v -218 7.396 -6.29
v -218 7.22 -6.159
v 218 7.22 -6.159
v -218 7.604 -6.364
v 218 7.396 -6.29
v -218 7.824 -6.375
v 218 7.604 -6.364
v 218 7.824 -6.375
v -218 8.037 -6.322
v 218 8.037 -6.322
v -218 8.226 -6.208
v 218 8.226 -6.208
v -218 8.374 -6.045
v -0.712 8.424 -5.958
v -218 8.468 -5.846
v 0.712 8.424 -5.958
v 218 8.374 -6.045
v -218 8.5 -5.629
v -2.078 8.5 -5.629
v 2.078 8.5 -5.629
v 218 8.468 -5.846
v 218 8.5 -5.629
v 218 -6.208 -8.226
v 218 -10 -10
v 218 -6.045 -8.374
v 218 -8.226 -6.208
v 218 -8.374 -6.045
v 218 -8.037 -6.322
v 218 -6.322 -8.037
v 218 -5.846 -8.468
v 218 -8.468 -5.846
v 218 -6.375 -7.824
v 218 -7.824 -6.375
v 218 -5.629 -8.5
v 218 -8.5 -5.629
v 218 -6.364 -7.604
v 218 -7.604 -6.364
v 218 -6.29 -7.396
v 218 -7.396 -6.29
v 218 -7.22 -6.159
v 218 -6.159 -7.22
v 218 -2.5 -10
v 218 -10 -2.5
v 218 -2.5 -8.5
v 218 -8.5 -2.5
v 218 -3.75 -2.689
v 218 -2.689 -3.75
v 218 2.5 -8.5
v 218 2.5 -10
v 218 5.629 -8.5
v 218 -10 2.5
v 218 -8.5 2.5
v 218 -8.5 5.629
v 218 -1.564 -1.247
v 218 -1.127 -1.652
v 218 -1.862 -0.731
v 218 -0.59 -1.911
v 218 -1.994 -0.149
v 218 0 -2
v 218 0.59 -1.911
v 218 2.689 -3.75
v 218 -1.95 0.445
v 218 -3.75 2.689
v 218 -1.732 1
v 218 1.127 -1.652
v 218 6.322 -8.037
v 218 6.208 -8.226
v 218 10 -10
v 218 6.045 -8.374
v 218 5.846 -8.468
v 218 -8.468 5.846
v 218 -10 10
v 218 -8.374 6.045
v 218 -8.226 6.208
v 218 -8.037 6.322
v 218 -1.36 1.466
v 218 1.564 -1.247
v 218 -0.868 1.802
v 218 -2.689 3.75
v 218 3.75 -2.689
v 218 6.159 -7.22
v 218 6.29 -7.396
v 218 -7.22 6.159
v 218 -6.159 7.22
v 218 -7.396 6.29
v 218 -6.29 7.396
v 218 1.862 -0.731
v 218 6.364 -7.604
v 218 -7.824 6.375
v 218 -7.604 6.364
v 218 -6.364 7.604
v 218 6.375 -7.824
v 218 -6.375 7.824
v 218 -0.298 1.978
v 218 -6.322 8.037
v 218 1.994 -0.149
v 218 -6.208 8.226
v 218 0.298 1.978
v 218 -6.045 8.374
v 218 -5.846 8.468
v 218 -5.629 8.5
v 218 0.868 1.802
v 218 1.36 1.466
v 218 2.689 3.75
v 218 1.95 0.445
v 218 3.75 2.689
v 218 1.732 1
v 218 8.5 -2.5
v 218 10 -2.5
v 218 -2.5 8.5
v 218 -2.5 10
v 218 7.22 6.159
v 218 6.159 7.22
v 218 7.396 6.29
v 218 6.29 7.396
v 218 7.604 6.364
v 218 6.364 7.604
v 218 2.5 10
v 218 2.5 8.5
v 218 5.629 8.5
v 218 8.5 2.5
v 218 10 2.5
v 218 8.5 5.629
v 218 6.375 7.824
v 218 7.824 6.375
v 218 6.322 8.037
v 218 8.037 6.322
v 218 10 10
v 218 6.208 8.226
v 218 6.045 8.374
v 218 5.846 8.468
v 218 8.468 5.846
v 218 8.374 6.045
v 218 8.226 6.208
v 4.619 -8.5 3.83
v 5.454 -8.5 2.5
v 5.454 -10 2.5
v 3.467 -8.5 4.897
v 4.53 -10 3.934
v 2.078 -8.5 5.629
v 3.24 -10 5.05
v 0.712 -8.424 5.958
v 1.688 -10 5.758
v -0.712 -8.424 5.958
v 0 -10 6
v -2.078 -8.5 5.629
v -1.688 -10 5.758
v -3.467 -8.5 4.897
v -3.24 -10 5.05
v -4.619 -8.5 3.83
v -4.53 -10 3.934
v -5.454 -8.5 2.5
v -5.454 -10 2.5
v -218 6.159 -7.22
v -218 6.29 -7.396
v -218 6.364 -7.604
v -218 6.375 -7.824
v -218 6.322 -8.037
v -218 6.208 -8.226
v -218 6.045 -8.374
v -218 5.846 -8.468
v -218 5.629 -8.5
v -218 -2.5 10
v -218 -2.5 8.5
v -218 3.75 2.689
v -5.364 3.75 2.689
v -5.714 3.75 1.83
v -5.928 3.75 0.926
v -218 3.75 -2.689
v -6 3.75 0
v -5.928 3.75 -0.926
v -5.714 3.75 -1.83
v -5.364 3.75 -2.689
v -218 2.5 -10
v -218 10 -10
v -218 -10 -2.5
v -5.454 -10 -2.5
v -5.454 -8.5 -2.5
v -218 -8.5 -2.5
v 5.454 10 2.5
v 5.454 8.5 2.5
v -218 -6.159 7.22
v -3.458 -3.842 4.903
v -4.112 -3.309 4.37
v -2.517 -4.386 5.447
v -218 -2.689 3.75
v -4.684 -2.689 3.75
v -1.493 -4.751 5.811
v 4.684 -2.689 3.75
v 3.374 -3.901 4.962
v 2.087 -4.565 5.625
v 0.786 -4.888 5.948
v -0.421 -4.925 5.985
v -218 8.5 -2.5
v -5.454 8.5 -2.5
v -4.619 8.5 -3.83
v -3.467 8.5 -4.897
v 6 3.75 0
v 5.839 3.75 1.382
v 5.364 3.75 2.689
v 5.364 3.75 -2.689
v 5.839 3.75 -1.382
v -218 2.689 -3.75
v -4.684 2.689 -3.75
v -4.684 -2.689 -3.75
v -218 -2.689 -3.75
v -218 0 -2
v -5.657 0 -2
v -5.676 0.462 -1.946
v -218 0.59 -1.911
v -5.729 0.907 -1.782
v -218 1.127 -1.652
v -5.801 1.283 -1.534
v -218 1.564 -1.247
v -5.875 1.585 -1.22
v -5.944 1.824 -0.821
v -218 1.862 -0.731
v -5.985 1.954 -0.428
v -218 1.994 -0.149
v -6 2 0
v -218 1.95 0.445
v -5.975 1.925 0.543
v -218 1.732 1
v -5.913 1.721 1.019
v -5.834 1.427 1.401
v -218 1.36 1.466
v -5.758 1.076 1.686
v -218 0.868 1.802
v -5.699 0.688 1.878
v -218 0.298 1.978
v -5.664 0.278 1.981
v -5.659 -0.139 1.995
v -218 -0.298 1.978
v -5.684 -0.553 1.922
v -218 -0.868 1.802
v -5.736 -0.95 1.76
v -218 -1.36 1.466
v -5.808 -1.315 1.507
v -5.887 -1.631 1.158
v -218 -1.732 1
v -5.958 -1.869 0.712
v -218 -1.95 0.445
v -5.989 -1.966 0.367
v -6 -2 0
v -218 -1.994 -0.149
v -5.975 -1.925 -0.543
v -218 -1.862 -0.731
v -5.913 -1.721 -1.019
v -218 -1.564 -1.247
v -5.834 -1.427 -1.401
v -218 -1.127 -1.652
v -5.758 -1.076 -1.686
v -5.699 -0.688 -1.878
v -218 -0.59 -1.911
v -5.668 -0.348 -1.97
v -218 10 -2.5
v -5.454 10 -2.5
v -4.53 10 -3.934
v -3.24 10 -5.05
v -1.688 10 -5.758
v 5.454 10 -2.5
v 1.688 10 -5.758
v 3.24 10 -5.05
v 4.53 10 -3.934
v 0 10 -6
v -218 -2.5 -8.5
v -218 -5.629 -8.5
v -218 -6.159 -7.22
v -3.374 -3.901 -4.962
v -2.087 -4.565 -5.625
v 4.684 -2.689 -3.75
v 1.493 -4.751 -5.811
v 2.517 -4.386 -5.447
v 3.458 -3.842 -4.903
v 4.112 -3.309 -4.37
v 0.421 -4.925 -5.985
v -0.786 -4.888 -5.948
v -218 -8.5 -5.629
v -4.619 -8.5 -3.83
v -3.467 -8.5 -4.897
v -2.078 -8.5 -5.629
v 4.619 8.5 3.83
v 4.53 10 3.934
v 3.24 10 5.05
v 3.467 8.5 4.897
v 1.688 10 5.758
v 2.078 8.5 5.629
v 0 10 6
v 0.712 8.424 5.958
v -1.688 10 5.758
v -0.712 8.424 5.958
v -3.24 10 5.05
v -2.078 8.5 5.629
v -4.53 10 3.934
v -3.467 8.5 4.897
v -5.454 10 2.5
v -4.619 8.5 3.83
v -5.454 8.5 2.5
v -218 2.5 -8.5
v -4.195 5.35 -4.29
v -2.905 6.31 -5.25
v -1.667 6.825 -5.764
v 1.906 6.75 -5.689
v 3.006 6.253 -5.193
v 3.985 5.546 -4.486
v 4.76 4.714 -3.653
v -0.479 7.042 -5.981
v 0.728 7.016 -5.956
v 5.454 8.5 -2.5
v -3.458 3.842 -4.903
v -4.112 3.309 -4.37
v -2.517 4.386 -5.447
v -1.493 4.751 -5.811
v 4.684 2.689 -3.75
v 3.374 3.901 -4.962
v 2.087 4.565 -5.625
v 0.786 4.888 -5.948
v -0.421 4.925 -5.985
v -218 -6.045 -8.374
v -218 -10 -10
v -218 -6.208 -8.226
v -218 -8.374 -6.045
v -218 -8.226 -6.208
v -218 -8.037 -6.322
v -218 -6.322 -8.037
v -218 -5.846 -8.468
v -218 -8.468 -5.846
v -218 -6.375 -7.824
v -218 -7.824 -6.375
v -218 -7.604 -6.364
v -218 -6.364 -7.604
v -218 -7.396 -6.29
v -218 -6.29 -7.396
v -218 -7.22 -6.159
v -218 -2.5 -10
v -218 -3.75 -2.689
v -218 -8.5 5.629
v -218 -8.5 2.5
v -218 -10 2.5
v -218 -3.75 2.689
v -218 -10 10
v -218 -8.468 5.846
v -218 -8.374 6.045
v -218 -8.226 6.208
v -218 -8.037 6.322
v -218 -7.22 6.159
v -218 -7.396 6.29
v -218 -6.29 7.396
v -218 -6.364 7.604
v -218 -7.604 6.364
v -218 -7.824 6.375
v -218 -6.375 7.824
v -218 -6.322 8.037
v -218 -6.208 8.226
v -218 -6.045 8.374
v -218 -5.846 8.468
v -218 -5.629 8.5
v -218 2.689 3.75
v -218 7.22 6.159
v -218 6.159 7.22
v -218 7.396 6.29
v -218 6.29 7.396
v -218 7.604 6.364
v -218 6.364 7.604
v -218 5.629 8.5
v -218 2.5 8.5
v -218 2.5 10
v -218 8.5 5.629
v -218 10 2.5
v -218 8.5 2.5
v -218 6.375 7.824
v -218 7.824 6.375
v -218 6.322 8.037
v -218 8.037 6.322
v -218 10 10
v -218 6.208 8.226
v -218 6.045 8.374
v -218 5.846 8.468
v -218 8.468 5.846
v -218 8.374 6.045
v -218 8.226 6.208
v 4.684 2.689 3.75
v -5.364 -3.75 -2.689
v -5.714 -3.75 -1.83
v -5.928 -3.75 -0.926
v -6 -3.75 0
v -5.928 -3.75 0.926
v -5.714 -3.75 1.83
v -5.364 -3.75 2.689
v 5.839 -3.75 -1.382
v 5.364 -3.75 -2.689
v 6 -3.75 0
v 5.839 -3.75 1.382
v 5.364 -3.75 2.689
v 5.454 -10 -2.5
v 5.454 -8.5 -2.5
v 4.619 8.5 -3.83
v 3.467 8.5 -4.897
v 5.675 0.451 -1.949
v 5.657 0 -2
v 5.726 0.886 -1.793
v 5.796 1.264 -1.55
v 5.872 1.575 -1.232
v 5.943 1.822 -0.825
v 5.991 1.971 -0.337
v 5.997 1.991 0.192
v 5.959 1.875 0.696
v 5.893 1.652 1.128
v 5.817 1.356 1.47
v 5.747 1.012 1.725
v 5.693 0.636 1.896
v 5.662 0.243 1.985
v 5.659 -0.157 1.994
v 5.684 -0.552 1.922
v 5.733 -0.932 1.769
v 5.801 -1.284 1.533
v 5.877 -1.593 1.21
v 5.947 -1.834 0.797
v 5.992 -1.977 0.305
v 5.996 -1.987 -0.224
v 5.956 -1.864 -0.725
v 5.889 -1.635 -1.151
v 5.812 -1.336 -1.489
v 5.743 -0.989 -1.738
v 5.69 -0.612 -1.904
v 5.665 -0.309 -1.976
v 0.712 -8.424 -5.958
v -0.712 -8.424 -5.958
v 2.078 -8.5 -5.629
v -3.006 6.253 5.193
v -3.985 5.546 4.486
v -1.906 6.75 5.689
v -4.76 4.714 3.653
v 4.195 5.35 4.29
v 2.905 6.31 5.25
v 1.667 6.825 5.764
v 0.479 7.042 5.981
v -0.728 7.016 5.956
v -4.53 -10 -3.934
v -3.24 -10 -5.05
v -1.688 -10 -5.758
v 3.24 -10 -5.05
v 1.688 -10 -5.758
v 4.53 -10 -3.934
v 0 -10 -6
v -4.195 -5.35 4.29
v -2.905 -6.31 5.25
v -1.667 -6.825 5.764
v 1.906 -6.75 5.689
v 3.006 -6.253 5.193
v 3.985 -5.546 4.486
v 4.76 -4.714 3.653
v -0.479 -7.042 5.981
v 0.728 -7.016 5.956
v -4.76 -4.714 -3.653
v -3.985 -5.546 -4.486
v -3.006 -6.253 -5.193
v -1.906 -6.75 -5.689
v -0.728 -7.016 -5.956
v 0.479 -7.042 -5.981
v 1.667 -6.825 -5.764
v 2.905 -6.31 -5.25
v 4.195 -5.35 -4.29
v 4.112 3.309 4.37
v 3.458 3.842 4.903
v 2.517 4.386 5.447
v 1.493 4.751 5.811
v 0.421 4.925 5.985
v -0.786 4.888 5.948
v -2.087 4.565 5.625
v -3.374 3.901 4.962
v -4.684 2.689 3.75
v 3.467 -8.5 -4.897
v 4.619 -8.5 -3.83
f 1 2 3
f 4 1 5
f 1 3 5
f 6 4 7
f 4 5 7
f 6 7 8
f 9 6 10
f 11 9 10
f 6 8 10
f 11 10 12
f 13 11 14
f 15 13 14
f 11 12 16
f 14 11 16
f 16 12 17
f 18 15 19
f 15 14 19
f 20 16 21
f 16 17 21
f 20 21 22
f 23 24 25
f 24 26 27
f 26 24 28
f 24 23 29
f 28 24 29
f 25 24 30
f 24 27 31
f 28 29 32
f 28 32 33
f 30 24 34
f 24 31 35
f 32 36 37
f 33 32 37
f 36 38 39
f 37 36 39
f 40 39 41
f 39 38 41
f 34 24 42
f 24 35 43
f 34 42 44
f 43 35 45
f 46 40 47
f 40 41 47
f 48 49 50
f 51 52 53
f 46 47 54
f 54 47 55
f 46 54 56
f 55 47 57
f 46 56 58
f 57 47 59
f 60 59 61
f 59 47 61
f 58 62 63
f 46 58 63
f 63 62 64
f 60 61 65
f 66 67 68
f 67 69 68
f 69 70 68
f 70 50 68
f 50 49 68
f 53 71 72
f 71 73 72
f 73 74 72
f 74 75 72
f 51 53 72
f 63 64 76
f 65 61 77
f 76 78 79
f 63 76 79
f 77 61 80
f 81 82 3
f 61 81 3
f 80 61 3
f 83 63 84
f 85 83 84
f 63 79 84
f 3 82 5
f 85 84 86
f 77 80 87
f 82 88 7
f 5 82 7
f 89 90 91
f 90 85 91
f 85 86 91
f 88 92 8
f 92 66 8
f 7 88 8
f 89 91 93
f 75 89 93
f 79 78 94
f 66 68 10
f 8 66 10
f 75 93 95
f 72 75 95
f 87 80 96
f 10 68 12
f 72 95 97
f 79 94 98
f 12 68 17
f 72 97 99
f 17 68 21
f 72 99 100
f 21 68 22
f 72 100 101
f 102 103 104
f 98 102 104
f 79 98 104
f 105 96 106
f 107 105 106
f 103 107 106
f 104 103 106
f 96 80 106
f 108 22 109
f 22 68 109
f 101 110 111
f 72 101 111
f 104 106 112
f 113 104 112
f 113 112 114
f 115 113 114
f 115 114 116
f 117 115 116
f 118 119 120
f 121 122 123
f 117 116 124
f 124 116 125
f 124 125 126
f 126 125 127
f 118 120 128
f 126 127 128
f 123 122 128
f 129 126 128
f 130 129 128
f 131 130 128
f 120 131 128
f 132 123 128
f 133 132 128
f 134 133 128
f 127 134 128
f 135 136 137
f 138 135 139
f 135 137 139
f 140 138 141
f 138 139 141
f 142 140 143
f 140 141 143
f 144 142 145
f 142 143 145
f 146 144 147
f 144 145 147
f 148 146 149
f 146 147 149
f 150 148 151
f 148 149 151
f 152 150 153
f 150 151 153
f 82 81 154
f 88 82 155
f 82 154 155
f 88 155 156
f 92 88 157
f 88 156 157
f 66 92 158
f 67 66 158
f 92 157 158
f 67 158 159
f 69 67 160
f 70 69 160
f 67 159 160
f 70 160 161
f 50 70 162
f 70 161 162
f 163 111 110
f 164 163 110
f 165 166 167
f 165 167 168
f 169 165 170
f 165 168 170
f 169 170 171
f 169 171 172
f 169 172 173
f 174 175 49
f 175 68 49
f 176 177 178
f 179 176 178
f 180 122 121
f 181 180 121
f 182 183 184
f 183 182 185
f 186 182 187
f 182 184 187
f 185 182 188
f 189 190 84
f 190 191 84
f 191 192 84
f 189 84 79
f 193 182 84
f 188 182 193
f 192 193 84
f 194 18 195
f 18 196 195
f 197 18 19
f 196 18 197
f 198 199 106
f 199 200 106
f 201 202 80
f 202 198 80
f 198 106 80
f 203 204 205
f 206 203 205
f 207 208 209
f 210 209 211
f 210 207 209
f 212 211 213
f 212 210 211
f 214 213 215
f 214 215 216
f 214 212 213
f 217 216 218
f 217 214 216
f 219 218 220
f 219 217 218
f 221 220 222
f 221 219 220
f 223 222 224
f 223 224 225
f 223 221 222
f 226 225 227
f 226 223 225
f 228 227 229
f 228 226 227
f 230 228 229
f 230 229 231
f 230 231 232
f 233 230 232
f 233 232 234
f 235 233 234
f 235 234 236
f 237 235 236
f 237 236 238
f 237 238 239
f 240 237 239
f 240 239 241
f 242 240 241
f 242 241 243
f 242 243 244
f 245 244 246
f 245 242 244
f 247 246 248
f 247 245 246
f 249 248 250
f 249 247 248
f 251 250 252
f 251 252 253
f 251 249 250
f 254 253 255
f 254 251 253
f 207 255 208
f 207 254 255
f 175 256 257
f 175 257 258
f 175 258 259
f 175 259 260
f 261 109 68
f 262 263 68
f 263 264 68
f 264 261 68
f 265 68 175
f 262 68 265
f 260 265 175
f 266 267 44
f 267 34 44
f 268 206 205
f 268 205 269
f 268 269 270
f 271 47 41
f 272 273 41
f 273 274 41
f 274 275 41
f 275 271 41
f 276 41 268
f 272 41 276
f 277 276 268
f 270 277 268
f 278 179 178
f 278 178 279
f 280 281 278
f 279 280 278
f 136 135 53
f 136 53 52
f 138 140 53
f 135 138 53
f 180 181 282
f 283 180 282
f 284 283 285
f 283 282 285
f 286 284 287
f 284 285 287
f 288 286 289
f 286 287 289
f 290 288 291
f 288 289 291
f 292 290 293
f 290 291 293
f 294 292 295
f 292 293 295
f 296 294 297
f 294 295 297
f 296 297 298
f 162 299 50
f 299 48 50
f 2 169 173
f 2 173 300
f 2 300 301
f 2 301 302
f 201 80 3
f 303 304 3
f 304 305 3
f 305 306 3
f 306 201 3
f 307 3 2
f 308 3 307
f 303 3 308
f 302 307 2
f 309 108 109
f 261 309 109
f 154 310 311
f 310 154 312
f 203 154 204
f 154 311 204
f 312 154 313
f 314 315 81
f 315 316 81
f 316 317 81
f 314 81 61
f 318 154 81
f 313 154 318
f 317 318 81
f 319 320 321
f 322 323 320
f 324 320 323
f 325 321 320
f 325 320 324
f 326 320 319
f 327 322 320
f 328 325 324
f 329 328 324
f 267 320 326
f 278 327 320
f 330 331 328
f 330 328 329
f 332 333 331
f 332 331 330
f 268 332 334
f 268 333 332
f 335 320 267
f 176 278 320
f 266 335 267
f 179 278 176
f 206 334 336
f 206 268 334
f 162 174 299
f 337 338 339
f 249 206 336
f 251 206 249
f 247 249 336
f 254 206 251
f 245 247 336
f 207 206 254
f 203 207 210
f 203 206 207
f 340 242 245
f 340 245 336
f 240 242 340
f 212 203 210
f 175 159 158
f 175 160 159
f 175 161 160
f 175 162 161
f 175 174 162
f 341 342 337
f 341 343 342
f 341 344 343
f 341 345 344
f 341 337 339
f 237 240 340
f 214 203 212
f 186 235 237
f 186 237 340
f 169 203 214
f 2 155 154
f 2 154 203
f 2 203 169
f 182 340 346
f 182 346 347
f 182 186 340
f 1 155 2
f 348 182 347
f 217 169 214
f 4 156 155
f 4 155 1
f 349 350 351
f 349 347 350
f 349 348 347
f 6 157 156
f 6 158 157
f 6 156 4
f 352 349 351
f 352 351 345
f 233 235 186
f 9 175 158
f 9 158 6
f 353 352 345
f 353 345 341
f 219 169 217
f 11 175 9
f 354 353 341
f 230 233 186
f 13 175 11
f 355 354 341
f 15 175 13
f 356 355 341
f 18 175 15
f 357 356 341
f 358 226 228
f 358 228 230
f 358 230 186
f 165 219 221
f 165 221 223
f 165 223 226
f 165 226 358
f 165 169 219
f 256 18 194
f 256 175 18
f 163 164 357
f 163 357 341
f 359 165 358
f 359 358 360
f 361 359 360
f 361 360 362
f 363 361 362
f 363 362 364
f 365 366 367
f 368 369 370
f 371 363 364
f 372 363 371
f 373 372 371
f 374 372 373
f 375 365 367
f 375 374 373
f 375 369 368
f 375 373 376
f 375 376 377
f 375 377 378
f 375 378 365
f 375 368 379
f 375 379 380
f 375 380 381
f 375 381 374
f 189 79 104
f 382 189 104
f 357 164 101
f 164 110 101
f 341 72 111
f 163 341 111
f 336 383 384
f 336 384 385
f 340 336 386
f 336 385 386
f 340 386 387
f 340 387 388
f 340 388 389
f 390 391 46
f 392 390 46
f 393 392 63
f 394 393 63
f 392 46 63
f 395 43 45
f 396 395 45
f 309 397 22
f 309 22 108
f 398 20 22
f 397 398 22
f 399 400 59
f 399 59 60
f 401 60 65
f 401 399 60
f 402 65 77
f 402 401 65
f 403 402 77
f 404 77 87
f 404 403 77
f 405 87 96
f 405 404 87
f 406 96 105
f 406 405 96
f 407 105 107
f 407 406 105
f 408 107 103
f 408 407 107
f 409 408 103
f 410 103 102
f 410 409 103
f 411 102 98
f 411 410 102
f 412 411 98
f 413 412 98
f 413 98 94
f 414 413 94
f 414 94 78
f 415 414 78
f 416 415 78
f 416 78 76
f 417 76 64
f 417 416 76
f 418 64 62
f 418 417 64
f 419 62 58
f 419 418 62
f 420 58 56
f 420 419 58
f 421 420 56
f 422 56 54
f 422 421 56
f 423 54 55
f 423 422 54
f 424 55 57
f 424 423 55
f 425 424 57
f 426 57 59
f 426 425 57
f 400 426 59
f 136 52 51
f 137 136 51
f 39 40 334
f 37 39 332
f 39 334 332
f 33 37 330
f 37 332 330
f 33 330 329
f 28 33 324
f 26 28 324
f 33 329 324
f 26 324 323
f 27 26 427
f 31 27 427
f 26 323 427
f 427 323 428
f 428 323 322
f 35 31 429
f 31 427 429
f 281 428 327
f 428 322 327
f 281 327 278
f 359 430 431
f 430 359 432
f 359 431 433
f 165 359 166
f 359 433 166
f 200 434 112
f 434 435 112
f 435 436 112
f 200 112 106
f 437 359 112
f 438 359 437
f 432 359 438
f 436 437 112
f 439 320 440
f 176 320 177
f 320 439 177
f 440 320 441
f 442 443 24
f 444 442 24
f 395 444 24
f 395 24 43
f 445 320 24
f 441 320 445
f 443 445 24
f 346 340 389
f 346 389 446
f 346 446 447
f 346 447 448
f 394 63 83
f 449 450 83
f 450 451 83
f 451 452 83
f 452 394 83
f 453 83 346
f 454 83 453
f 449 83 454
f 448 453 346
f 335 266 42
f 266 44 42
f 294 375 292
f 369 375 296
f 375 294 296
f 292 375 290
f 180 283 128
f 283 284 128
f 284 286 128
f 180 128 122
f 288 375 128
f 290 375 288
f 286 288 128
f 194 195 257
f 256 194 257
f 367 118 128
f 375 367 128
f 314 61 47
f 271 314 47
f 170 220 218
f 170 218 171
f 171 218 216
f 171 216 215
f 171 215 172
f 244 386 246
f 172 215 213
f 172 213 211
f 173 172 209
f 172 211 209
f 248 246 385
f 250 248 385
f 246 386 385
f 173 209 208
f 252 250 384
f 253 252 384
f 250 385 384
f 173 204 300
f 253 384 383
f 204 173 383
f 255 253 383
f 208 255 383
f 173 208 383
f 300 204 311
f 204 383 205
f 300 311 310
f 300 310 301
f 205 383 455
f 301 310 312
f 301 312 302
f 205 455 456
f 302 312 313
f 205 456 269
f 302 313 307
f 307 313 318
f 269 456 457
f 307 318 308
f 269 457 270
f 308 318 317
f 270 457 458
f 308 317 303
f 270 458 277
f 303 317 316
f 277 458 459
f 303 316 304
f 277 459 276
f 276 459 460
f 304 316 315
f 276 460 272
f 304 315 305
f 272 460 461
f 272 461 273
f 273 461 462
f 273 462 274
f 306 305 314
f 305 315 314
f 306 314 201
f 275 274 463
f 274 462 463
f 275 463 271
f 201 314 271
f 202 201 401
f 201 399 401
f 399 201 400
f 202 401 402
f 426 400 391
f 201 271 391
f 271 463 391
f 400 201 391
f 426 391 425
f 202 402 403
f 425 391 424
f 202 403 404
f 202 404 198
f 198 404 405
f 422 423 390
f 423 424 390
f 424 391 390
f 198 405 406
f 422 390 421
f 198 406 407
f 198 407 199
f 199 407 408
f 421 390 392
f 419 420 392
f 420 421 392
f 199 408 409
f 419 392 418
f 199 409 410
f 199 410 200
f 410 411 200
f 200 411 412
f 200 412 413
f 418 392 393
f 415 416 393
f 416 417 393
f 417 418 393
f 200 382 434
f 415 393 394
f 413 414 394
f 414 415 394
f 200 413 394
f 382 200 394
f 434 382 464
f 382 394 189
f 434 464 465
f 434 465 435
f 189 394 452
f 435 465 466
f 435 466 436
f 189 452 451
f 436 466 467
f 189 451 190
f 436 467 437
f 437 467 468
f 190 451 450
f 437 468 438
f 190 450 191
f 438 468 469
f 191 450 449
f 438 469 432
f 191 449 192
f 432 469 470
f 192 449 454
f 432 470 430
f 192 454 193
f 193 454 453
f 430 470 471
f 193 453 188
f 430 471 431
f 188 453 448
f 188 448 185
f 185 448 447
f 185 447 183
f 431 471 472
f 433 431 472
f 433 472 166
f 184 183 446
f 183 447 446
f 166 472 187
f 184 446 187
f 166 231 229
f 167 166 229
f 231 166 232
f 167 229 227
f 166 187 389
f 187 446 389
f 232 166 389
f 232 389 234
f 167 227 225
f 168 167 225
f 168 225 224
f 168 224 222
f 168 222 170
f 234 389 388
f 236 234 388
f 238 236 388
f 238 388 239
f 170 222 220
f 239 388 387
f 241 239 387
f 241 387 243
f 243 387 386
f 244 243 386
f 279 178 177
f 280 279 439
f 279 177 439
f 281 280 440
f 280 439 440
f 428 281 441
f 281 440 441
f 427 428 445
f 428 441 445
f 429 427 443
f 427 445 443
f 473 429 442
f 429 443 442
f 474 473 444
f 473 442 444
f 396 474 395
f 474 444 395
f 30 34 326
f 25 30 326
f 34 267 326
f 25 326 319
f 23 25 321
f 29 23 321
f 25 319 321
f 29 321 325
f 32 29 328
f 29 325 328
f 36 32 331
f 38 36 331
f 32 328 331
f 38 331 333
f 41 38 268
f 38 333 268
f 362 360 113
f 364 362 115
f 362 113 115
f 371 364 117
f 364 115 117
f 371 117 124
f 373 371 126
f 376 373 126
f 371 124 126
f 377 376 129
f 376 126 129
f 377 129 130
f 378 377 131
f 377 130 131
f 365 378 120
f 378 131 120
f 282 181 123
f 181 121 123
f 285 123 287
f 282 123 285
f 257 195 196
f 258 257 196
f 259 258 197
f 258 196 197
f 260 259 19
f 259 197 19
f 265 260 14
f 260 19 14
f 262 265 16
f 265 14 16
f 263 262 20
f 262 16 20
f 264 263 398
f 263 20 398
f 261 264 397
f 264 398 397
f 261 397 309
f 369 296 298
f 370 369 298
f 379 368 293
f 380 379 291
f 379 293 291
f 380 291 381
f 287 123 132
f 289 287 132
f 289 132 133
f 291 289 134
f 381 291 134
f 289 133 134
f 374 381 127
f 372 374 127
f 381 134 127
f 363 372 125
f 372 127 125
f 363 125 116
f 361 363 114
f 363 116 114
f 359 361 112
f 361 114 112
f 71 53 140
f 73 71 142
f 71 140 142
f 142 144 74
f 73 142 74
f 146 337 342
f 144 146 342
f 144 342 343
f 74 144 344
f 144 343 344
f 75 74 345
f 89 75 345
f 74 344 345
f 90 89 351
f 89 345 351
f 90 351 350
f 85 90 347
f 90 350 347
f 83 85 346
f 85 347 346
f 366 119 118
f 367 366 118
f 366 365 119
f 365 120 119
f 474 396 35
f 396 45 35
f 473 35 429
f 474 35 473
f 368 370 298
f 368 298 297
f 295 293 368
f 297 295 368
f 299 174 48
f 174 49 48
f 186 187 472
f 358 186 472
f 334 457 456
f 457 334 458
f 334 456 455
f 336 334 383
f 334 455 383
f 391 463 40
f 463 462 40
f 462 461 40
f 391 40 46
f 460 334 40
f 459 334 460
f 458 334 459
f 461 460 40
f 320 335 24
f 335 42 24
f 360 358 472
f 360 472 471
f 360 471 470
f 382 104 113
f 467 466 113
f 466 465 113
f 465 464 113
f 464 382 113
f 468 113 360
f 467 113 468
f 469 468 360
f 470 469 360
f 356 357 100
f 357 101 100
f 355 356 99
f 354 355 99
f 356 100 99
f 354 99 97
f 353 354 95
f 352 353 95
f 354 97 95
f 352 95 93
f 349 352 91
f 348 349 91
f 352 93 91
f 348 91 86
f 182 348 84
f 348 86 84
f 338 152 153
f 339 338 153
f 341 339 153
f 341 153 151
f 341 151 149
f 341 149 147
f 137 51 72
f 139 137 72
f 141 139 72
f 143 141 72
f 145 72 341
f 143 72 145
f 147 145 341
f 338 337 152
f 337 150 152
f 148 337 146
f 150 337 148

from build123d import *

# Parameters (mm, degrees)
ESQUISSE1_R                     = 2
BOSS_EXTRU_1_DEPTH              = 218
CONG_1_R                        = 0.75
DIAM_TRE_DU_PER_AGE_12_0_12_2_D = 12


with BuildPart() as part:
    # Esquisse1 → Boss.-Extru.1 (new, symmetric)
    with BuildSketch(Plane(origin=(0, 0, 0), x_dir=(0, 0, -1), z_dir=(1, 0, 0))):
        Polygon((2.5, 10), (10, 10), (10, 2.5), (8.5, 2.5), (8.5, 7.439339828), (3.75, 2.689339828), (3.75, -2.689339828), (8.5, -7.439339828), (8.5, -2.5), (10, -2.5), (10, -10), (2.5, -10), (2.5, -8.5), (7.439339828, -8.5), (2.689339828, -3.75), (-2.689339828, -3.75), (-7.439339828, -8.5), (-2.5, -8.5), (-2.5, -10), (-10, -10), (-10, -2.5), (-8.5, -2.5), (-8.5, -7.439339828), (-3.75, -2.689339828), (-3.75, 2.689339828), (-8.5, 7.439339828), (-8.5, 2.5), (-10, 2.5), (-10, 10), (-2.5, 10), (-2.5, 8.5), (-7.439339828, 8.5), (-2.689339828, 3.75), (2.689339828, 3.75), (7.439339828, 8.5), (2.5, 8.5), align=None)
        Circle(ESQUISSE1_R, mode=Mode.SUBTRACT)
    extrude(amount=BOSS_EXTRU_1_DEPTH, both=True)

    # Congé1
    cong_1_edges = [part.edges().sort_by_distance(p)[0] for p in [
        (0, 7.439339828, -8.5),
        (0, -7.439339828, -8.5),
        (0, -8.5, -7.439339828),
        (0, -8.5, 7.439339828),
        (0, -7.439339828, 8.5),
        (0, 7.439339828, 8.5),
        (0, 8.5, 7.439339828),
        (0, 8.5, -7.439339828),
    ]]
    fillet(cong_1_edges, radius=CONG_1_R)

    # Diamètre du perçage Ø12.0 (12)2 (through all)
    with Locations(Plane(origin=(0, 10, 0), x_dir=(1, 0, 0), z_dir=(0, 1, 0))):
        with Locations((0, 0)):
            Hole(DIAM_TRE_DU_PER_AGE_12_0_12_2_D / 2)


solid = part.part
